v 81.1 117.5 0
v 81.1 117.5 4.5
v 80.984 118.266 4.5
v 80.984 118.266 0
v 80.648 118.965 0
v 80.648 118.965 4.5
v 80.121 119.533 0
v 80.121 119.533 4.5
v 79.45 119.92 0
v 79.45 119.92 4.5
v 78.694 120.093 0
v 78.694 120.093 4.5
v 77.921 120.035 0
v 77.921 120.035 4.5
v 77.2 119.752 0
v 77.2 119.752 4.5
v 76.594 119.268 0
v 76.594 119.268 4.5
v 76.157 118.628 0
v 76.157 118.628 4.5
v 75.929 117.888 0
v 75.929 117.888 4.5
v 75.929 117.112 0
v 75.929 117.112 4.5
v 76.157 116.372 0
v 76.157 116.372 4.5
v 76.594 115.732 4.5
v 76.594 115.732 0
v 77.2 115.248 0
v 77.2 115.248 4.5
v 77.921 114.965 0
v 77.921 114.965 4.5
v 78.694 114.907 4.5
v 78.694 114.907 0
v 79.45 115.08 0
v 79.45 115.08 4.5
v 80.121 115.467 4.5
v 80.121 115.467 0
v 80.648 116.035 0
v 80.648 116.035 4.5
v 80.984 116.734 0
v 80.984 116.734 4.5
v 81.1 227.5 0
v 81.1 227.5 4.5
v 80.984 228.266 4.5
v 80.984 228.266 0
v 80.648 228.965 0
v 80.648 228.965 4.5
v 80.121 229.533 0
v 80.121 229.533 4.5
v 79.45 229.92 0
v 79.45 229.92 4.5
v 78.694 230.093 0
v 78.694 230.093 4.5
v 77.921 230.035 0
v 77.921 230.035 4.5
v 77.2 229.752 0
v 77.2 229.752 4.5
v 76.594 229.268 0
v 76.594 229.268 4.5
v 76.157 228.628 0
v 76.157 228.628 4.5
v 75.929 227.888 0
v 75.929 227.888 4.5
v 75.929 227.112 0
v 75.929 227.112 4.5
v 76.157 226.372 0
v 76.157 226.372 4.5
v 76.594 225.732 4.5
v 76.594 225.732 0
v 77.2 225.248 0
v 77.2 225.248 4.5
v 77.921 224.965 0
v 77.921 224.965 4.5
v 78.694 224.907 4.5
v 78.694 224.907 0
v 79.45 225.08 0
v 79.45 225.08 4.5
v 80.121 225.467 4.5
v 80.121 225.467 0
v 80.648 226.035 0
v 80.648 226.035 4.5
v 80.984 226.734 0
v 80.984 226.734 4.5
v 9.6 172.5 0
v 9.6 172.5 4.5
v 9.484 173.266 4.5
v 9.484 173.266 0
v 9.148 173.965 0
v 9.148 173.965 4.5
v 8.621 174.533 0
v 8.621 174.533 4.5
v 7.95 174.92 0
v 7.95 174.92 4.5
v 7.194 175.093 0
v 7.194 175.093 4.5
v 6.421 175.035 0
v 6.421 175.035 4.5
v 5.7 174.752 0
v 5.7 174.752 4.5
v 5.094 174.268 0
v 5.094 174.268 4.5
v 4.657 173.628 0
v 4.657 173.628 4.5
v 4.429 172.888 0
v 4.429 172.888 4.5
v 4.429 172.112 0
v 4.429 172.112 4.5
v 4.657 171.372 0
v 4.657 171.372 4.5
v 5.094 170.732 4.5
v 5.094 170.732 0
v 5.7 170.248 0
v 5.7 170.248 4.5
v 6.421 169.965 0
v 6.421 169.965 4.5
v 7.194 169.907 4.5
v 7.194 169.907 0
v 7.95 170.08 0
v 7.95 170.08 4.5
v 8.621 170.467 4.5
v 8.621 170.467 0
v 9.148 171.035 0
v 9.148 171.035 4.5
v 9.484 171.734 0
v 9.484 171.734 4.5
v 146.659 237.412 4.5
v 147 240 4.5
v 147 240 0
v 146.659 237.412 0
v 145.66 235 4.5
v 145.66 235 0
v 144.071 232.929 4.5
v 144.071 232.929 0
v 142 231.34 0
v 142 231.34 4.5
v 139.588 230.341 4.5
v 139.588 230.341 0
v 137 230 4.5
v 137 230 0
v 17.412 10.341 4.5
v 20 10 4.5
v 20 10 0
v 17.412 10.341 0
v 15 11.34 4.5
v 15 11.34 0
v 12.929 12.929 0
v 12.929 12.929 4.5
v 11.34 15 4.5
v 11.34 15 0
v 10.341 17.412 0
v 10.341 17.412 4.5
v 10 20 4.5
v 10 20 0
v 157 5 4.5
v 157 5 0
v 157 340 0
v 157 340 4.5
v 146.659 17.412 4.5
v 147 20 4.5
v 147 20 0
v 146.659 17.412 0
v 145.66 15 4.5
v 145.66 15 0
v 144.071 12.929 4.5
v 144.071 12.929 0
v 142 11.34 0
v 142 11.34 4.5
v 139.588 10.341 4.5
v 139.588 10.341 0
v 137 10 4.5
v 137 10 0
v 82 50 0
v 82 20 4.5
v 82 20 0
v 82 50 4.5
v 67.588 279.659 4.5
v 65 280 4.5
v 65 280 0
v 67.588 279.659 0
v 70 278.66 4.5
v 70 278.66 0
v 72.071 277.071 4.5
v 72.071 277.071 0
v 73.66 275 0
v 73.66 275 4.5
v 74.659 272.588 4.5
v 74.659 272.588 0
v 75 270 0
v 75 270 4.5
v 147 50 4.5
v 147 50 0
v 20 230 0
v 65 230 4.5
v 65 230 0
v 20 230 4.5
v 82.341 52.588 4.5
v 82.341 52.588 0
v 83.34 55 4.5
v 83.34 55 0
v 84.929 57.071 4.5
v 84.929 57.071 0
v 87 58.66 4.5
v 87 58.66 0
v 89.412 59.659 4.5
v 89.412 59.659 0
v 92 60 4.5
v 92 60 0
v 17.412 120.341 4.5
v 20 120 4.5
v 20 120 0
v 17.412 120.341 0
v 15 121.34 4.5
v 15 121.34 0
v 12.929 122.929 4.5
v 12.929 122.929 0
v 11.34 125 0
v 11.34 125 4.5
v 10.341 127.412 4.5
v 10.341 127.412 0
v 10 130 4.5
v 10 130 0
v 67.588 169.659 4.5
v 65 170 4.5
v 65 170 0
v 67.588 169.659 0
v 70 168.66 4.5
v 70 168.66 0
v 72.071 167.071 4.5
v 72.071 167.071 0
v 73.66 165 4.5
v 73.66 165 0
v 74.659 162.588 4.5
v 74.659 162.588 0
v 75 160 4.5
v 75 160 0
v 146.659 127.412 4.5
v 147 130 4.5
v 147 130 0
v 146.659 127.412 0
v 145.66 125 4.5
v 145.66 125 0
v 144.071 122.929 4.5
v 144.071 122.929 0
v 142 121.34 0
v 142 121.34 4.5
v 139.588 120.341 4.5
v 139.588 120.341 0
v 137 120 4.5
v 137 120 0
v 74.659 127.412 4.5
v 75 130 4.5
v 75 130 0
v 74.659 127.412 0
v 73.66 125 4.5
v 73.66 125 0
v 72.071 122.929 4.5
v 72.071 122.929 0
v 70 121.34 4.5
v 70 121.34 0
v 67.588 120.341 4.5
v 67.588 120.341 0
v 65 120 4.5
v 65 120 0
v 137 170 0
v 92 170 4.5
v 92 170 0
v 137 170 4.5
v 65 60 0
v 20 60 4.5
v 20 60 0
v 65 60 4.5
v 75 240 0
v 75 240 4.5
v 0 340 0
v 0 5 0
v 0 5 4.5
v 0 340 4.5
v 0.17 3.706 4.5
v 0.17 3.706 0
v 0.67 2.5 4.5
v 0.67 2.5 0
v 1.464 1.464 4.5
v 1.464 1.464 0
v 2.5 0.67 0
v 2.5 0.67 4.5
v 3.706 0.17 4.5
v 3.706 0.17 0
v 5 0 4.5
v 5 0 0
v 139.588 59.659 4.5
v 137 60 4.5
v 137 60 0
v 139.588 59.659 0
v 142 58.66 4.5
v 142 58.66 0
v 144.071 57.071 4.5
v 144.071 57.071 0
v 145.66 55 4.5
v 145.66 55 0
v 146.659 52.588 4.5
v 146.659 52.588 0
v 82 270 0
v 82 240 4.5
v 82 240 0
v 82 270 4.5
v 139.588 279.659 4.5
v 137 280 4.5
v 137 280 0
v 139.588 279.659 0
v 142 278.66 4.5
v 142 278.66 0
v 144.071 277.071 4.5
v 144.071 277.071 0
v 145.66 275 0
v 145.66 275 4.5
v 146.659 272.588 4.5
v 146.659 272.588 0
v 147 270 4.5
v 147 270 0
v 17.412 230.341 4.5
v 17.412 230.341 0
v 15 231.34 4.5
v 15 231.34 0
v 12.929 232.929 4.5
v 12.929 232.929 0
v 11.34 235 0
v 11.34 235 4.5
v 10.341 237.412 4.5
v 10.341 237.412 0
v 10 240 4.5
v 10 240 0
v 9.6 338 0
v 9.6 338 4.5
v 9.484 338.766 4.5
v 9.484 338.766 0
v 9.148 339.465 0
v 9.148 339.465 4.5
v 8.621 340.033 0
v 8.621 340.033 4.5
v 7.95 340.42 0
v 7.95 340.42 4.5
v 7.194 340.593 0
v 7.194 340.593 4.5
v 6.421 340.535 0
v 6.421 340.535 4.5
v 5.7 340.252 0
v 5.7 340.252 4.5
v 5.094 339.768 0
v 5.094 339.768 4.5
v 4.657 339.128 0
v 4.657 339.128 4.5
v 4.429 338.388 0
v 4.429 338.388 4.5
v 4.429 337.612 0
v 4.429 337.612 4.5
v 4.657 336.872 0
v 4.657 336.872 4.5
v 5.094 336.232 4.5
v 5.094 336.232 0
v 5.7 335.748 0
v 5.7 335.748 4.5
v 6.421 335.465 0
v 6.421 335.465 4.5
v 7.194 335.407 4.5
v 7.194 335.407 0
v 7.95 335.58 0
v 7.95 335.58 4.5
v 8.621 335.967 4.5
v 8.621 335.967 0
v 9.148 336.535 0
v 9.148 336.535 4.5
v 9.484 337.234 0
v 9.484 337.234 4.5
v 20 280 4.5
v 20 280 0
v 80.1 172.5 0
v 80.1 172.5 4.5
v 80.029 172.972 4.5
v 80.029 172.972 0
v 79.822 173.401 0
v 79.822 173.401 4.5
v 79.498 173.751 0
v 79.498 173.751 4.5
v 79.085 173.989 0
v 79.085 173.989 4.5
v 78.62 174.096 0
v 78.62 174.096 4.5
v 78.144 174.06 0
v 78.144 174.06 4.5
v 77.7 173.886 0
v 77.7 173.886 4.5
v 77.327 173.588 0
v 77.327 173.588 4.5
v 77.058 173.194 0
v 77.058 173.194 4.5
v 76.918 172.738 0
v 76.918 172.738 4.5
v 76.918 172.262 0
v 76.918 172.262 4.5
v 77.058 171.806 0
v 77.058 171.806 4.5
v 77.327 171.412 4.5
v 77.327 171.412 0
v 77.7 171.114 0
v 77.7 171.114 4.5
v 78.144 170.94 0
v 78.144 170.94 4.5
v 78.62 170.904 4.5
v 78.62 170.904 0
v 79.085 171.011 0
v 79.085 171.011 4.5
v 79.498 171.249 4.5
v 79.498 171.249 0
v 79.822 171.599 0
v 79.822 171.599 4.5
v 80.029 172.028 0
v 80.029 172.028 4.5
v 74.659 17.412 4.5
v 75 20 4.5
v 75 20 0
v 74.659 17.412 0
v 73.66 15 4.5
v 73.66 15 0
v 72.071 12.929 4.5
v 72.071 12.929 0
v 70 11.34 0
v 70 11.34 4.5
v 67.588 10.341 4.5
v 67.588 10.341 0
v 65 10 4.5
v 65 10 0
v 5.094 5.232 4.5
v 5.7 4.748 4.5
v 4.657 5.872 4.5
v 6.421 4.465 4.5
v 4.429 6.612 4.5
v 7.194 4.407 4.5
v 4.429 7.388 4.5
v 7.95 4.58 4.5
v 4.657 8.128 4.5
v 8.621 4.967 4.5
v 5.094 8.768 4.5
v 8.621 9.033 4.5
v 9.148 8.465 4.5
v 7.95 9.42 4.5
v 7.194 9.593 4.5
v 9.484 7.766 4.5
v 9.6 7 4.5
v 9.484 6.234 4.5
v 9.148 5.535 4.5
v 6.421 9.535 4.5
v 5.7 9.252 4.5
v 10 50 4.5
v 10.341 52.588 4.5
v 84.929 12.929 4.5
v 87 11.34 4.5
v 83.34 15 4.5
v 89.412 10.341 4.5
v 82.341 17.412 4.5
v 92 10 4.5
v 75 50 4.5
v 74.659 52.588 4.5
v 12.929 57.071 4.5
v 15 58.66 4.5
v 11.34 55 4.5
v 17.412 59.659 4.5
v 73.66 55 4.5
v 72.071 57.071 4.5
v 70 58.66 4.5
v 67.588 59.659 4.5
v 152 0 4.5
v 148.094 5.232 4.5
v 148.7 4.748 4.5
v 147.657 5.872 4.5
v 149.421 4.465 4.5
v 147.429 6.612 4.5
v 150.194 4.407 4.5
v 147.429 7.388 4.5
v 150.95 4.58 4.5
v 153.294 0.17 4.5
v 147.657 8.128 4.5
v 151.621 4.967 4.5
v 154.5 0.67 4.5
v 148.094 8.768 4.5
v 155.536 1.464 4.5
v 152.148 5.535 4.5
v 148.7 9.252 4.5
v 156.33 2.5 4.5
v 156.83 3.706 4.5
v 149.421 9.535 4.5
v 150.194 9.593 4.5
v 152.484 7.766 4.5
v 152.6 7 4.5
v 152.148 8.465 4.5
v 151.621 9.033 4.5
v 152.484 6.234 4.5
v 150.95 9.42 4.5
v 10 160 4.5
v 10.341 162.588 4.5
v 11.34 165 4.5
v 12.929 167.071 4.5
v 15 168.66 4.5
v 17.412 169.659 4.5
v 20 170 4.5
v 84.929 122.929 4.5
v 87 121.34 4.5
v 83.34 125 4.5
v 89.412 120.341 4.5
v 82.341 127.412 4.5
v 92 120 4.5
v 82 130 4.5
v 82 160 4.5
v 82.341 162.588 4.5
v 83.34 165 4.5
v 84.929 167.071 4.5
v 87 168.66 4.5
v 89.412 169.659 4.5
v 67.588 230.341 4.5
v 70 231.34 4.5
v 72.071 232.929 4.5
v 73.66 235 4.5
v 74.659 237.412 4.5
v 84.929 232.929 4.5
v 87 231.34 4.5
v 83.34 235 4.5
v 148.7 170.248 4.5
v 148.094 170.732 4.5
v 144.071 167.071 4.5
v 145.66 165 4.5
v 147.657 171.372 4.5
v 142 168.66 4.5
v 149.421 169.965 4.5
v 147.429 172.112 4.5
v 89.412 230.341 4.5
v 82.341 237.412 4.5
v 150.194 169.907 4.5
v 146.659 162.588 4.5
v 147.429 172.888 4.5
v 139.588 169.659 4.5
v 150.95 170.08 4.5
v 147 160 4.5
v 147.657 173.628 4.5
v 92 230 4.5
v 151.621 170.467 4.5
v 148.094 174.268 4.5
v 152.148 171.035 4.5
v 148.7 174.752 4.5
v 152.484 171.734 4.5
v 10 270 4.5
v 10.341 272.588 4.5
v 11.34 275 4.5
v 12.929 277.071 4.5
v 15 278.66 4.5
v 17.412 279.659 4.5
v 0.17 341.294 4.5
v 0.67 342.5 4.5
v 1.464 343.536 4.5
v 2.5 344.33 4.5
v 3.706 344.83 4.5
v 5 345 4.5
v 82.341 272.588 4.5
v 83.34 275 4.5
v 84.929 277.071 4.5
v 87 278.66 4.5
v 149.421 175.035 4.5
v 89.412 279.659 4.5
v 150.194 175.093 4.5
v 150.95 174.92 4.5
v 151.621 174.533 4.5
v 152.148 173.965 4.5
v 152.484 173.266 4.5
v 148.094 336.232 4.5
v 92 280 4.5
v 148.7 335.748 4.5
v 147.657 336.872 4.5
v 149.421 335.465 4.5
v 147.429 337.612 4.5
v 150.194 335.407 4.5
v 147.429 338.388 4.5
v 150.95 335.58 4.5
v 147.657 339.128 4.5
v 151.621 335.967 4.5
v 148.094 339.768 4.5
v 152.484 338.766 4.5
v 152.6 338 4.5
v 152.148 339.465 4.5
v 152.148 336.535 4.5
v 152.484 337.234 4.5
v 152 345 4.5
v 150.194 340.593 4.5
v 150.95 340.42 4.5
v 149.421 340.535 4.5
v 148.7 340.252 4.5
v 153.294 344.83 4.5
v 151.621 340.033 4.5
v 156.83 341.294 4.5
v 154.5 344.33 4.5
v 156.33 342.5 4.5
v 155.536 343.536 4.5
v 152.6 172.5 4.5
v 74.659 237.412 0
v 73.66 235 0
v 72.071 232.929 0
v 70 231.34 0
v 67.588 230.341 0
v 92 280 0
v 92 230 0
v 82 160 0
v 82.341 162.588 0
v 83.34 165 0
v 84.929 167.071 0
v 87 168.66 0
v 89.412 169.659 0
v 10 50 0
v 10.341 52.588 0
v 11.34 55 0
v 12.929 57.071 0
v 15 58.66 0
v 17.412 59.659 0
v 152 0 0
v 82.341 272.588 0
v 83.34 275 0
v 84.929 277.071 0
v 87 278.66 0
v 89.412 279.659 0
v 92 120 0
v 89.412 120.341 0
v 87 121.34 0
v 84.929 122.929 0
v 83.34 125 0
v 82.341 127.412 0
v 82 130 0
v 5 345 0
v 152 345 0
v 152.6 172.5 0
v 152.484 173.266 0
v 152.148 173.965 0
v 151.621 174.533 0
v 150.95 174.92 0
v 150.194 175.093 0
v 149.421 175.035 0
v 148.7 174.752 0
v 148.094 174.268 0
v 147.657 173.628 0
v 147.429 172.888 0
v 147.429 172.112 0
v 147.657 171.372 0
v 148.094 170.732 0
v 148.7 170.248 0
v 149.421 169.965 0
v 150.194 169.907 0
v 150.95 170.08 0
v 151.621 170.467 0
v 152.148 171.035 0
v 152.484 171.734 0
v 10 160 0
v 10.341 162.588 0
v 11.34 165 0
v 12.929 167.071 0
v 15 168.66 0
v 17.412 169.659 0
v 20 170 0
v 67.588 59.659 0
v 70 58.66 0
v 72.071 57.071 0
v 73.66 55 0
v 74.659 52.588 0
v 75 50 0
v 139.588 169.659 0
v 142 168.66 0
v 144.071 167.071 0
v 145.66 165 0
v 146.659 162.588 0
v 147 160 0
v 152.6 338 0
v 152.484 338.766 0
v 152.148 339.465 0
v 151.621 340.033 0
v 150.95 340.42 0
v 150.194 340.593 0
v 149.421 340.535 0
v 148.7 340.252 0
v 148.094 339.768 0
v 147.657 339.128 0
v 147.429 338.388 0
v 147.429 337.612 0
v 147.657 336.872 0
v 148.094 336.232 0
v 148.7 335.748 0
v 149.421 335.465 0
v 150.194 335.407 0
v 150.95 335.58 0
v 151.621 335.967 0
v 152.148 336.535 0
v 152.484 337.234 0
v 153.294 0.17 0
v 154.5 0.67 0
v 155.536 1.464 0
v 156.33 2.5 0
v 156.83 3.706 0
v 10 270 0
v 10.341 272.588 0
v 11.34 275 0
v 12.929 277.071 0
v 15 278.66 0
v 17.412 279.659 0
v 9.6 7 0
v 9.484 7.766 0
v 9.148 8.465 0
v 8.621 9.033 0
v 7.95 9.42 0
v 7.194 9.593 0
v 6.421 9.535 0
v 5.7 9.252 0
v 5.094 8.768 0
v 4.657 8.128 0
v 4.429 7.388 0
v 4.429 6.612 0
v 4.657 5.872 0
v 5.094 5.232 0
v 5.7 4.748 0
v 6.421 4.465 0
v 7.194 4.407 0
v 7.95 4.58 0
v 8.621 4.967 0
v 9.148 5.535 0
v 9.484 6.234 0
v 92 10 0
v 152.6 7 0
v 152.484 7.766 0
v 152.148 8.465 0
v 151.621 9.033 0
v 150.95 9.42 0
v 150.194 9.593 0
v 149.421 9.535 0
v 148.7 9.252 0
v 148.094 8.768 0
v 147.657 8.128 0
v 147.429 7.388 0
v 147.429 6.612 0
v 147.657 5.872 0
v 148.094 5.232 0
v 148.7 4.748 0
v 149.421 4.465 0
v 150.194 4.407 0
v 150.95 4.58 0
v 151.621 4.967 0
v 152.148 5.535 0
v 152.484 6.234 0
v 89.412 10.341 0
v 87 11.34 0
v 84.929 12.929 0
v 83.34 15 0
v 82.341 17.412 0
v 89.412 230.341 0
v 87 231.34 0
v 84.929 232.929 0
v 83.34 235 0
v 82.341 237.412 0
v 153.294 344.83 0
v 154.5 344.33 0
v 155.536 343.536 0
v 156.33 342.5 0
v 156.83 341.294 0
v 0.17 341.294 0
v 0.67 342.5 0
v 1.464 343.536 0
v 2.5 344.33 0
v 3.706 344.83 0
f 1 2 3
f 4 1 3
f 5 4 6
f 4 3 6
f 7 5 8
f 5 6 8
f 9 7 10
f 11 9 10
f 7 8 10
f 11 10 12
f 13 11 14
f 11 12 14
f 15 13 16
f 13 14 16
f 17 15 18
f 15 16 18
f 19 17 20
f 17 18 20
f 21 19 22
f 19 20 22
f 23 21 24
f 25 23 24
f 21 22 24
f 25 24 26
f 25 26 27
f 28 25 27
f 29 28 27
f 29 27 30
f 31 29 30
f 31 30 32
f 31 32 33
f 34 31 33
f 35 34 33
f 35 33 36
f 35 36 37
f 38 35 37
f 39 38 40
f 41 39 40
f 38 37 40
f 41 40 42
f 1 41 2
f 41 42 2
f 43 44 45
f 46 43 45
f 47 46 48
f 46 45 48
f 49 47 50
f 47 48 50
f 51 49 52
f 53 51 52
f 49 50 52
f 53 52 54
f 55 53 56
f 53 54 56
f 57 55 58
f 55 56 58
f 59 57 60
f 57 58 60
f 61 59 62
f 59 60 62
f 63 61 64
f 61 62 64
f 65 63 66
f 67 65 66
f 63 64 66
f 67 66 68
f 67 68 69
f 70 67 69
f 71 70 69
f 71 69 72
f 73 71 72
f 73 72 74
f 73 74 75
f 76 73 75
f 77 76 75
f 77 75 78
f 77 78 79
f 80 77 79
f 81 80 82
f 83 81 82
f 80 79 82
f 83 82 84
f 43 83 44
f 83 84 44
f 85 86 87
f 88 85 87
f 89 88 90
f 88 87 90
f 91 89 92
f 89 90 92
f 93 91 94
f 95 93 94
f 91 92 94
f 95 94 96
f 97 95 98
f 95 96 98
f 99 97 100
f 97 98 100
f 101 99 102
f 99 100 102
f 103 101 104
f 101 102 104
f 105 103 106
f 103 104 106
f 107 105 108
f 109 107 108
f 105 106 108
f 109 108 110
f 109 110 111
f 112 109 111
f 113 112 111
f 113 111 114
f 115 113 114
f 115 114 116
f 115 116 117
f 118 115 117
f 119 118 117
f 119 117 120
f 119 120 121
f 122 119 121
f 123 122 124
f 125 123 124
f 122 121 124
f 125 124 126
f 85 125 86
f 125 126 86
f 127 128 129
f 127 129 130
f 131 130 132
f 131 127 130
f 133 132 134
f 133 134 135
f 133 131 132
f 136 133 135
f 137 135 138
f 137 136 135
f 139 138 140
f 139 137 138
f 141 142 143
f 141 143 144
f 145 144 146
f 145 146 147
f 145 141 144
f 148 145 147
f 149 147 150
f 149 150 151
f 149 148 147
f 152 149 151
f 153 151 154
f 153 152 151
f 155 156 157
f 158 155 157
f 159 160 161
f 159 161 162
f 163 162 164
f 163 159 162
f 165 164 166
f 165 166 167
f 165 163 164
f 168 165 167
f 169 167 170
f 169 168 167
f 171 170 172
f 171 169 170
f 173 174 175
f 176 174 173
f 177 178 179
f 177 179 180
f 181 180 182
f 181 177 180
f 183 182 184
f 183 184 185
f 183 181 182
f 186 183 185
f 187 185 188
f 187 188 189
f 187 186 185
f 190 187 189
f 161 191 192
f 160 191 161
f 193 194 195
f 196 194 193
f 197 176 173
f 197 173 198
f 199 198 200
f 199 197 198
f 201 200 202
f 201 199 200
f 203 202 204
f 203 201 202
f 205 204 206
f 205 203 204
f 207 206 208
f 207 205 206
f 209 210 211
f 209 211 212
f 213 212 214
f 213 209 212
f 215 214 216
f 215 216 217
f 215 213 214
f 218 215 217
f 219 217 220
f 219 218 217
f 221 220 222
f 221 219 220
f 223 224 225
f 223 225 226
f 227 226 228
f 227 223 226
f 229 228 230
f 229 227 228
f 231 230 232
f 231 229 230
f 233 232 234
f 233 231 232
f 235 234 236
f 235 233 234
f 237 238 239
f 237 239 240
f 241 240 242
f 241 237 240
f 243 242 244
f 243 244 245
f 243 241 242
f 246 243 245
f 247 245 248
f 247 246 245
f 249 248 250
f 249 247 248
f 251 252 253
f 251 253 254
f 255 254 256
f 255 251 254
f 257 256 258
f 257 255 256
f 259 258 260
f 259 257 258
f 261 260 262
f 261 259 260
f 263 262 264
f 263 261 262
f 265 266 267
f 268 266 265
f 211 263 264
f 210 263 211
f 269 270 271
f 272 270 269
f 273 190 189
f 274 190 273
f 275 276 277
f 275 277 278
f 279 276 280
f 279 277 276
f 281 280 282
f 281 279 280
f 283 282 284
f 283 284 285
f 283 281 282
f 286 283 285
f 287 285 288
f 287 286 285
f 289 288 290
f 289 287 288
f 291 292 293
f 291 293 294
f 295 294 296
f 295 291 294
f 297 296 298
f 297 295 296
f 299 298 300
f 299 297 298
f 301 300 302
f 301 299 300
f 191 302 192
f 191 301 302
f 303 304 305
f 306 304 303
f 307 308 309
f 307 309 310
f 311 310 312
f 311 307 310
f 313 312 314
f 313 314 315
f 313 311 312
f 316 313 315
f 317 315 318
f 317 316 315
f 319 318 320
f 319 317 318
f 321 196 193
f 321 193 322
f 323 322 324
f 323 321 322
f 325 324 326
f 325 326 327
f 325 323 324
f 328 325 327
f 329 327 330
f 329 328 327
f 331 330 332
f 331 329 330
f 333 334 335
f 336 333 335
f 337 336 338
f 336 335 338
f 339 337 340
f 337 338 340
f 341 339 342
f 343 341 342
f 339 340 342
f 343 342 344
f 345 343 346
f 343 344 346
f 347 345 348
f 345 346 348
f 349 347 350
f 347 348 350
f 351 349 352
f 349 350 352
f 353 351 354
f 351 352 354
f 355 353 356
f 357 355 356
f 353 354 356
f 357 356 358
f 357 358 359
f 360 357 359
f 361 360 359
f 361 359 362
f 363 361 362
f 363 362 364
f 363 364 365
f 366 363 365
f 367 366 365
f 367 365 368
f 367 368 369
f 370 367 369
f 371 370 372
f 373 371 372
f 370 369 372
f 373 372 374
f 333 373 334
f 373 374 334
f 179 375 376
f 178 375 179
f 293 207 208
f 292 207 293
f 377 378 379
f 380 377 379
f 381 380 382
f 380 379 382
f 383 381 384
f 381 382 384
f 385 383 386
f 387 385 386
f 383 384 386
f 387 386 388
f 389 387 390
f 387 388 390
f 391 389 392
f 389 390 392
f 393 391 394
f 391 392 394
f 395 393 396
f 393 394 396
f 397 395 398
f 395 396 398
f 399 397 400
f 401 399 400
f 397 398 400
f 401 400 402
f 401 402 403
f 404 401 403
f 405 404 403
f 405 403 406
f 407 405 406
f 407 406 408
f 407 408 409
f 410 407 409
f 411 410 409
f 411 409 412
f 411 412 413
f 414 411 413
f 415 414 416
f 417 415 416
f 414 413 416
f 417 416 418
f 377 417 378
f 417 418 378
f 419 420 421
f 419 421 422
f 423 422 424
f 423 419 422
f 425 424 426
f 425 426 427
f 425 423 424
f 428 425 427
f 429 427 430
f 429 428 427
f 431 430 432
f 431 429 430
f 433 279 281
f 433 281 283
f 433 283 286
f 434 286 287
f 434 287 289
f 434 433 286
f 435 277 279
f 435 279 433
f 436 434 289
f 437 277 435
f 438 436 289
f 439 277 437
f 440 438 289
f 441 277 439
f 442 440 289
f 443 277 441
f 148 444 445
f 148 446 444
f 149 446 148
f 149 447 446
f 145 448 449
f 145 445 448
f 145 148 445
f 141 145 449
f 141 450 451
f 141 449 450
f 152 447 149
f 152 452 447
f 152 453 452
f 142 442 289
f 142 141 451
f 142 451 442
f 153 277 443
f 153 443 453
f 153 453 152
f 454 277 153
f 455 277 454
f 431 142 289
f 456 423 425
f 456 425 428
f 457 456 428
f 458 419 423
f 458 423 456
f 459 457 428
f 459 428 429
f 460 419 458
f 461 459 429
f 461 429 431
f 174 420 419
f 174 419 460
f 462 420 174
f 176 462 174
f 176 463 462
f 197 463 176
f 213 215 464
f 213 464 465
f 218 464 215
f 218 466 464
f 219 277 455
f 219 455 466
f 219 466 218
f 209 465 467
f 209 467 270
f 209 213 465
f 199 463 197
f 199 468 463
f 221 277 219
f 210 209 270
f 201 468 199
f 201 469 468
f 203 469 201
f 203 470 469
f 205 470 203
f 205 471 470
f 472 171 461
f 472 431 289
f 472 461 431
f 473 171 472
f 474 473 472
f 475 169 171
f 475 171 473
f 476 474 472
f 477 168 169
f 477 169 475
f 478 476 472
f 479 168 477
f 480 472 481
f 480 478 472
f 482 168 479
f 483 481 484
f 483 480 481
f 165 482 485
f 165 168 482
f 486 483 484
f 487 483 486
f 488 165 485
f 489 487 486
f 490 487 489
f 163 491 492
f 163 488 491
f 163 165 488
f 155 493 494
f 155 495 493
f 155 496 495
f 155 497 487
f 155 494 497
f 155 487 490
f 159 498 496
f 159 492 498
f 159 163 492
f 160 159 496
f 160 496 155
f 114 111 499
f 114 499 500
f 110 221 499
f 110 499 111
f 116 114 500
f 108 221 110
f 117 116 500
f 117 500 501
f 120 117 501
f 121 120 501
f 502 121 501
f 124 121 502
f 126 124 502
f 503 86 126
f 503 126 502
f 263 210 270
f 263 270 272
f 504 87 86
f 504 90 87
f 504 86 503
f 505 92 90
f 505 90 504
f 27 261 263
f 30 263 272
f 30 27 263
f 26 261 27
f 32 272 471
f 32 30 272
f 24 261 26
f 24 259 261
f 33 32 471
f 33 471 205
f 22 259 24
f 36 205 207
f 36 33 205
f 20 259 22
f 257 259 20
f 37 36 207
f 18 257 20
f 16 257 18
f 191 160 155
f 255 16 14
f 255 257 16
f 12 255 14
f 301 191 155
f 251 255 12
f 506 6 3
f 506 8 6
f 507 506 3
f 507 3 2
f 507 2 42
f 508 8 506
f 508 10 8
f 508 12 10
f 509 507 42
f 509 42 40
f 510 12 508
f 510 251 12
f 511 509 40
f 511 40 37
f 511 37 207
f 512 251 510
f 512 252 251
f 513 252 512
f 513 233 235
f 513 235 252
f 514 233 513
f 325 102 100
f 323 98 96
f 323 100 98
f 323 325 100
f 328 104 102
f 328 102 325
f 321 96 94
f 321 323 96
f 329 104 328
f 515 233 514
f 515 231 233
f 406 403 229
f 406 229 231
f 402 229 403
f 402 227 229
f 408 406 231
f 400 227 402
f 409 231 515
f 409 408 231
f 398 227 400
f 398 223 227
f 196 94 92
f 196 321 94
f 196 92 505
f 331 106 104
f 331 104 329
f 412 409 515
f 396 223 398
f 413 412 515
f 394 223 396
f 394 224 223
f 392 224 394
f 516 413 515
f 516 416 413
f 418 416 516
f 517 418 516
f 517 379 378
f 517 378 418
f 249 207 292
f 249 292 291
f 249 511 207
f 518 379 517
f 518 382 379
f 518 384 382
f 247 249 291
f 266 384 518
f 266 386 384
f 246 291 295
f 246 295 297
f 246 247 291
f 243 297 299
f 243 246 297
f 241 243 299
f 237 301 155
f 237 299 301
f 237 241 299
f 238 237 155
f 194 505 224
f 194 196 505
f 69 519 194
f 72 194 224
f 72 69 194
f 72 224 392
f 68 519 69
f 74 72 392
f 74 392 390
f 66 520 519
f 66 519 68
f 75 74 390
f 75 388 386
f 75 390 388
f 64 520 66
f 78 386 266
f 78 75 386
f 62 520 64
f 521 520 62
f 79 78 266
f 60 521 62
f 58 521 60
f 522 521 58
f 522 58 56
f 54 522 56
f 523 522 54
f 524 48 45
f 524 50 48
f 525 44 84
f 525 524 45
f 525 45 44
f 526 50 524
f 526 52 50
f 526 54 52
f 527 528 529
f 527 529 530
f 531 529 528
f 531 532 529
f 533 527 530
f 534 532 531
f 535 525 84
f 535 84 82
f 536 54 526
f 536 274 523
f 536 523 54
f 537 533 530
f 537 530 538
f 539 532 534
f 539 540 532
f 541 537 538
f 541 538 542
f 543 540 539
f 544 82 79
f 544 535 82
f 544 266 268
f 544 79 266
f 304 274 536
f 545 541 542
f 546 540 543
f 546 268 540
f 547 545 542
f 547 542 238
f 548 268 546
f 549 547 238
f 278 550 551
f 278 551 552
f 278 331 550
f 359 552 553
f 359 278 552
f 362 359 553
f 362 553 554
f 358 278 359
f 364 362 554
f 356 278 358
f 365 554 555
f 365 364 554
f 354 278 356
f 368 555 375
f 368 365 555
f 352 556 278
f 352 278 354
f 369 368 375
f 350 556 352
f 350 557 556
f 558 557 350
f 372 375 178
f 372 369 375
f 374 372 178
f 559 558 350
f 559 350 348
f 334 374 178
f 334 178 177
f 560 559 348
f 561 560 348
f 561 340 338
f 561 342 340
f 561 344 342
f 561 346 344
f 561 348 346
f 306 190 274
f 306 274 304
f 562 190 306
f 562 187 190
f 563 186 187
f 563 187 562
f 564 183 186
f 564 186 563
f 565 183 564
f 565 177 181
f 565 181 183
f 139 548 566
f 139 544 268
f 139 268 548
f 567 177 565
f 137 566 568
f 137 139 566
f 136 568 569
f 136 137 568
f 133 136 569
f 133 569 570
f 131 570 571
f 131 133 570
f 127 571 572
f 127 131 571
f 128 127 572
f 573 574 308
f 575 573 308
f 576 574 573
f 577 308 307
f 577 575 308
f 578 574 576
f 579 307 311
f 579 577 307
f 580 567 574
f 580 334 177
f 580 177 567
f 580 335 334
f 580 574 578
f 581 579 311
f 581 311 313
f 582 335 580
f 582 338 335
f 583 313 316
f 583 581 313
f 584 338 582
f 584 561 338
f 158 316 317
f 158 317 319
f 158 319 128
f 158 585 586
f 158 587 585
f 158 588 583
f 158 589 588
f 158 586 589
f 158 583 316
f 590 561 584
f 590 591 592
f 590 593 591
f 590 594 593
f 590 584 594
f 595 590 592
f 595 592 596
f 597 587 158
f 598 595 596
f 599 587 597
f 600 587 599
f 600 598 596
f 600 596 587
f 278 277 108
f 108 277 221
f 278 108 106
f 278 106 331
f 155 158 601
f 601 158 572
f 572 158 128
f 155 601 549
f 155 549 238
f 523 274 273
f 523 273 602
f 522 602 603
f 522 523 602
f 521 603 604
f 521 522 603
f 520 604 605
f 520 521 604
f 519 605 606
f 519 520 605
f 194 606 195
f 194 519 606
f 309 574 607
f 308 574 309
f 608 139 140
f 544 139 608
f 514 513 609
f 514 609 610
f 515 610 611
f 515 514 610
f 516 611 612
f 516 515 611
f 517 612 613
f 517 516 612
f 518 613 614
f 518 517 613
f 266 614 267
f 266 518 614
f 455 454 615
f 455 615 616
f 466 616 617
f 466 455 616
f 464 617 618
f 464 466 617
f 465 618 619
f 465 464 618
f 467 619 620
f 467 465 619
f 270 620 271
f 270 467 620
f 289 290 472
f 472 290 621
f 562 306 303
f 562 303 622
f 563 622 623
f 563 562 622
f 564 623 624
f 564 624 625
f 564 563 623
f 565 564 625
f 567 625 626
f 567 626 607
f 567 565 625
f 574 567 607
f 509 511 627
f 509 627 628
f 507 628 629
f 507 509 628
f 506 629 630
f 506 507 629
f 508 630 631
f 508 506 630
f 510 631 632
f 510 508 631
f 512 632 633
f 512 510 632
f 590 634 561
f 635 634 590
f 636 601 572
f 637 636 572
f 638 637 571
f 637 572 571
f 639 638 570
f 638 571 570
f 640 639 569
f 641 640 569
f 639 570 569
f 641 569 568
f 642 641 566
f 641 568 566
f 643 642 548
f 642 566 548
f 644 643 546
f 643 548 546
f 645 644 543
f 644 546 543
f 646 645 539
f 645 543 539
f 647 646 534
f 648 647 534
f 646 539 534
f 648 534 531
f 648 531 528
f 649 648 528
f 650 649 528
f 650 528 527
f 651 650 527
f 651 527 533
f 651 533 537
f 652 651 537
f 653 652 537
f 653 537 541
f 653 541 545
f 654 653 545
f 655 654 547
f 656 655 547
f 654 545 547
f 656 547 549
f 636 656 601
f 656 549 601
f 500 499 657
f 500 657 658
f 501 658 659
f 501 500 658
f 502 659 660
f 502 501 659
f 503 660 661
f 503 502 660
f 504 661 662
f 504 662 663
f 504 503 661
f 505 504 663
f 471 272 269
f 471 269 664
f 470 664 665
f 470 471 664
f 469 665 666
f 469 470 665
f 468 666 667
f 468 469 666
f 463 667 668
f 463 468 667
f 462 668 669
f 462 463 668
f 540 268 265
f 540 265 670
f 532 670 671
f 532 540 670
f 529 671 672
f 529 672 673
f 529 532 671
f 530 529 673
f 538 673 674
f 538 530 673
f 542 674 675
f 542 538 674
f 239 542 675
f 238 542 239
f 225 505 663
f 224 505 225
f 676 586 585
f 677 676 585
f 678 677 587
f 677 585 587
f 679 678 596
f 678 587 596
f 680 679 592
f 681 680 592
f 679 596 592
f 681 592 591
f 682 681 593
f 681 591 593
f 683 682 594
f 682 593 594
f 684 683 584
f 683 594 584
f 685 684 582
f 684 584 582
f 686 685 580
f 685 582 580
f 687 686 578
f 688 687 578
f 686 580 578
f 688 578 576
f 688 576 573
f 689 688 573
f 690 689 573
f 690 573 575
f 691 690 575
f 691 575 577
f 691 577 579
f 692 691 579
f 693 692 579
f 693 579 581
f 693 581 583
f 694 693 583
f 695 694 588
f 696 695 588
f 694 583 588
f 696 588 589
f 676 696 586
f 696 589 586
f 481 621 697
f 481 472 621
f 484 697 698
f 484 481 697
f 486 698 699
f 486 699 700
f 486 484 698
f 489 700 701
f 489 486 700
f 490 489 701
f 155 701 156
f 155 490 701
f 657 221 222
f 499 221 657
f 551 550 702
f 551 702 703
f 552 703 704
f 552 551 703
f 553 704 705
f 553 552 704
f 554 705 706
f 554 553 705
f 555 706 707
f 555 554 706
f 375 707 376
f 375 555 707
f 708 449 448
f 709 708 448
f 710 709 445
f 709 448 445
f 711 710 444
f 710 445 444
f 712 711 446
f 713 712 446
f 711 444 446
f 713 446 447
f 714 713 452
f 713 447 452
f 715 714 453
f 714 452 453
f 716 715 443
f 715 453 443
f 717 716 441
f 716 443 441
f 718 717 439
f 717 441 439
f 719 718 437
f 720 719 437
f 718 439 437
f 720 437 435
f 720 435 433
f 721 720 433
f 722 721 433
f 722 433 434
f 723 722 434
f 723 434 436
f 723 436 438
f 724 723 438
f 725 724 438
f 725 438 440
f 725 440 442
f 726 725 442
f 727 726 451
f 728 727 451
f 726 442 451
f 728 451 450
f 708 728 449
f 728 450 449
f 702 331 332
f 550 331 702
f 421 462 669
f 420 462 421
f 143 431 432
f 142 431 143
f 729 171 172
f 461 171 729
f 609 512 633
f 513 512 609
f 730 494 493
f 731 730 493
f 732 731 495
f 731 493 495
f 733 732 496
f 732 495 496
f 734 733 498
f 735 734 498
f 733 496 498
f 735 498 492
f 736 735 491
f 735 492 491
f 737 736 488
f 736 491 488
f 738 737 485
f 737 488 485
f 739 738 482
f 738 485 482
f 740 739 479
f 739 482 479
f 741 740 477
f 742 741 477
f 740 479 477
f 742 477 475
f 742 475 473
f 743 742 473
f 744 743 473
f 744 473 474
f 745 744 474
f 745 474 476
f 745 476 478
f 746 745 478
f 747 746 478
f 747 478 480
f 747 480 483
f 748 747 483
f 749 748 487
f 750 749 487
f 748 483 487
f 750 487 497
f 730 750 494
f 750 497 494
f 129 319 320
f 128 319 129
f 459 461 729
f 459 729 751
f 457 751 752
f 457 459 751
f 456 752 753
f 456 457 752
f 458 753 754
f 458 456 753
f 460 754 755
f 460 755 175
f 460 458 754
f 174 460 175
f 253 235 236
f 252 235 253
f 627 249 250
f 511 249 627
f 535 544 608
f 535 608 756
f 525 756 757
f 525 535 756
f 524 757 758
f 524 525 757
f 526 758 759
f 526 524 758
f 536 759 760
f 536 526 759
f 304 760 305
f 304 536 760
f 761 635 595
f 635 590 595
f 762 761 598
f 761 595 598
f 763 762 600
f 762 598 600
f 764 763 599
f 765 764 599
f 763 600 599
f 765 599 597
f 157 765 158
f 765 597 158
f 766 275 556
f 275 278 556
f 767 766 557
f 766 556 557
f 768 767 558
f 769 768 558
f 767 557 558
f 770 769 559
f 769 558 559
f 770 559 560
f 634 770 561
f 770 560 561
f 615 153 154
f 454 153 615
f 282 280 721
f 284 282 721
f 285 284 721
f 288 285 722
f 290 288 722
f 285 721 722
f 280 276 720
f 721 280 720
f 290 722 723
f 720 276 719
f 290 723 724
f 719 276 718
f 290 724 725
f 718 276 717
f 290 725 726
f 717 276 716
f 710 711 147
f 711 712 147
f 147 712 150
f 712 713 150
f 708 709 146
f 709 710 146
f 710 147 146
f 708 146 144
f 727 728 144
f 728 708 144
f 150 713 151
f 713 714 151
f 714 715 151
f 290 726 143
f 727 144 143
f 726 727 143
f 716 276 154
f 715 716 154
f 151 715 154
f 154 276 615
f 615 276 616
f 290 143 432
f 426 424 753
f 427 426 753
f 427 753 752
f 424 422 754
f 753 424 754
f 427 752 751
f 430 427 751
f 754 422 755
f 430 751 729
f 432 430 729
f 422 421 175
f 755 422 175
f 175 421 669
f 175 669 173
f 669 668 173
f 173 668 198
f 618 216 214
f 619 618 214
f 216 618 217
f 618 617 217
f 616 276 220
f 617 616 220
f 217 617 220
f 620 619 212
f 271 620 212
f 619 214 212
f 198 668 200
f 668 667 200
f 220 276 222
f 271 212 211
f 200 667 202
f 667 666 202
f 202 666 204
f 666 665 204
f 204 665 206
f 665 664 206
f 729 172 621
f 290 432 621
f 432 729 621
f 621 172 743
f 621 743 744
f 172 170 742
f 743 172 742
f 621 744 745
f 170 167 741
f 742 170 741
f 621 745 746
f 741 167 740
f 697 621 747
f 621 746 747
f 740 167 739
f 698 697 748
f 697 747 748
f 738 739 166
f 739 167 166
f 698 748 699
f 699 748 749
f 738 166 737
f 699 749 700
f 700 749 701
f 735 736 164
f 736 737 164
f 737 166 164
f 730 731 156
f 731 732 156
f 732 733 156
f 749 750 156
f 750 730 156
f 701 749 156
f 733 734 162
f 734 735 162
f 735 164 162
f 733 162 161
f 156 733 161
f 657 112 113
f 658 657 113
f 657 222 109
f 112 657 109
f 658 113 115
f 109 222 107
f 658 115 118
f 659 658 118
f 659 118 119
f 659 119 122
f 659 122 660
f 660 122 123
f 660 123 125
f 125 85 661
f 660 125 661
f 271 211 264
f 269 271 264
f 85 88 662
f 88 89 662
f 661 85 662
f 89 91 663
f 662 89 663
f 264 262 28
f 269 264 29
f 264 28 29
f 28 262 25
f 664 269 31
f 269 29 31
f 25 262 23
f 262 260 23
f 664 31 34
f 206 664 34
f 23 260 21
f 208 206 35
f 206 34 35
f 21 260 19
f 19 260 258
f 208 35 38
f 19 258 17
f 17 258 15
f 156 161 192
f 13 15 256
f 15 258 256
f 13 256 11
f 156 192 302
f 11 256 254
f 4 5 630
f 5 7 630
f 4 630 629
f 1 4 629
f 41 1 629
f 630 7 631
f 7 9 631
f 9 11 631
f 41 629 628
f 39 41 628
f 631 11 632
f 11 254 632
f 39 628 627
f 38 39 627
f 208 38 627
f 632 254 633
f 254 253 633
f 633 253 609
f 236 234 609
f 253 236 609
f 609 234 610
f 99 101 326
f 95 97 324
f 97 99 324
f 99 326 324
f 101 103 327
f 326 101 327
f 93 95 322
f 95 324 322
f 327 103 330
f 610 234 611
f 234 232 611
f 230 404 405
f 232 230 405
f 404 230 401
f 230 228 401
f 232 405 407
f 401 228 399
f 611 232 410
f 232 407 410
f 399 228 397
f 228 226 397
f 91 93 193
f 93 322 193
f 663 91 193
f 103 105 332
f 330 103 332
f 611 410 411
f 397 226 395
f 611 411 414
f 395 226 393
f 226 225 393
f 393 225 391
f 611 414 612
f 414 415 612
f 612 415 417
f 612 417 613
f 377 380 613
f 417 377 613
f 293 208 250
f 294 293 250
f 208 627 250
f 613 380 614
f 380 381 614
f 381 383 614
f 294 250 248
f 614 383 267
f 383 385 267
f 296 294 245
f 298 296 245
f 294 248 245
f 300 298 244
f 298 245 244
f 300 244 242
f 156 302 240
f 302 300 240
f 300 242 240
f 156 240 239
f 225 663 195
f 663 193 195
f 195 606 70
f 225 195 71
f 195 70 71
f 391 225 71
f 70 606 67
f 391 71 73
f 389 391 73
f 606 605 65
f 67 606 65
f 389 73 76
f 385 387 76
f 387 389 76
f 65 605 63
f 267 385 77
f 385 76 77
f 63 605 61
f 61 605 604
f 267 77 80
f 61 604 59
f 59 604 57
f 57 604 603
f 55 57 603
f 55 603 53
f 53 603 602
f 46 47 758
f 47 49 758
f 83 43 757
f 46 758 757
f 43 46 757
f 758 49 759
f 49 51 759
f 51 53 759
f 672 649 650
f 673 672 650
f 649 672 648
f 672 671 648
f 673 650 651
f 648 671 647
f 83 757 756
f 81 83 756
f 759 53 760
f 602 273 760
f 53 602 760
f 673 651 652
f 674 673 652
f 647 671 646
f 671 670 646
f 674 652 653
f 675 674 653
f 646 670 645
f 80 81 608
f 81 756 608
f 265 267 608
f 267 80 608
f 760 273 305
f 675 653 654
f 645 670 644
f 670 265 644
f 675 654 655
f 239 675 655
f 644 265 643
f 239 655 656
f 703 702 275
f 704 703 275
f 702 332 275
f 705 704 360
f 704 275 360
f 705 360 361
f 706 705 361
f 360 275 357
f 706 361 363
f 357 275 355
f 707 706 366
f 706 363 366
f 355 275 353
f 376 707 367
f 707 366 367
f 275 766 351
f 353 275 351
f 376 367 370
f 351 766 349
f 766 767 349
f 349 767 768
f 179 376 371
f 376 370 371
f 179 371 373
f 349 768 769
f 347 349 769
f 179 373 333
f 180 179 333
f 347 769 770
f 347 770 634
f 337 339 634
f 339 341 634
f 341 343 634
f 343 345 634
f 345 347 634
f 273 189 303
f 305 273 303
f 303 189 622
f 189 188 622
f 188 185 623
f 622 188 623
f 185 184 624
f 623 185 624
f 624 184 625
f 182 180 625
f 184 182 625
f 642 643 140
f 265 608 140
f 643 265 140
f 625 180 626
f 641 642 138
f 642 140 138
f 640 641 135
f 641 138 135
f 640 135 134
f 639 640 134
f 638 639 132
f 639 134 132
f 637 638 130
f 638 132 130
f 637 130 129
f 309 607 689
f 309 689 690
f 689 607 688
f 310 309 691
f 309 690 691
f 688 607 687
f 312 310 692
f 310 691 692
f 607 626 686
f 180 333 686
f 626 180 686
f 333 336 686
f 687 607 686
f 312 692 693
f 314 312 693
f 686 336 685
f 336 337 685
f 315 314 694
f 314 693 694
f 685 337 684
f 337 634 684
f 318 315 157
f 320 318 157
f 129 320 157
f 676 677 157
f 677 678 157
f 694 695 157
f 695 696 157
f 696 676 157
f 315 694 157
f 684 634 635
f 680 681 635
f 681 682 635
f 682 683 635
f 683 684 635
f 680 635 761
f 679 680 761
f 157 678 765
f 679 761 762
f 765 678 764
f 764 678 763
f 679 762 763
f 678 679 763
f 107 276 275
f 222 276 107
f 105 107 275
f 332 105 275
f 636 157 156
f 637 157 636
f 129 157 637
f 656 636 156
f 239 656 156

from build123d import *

# Parameters (mm, degrees)
SKETCH_1_W          = 157
SKETCH_1_H          = 345
EXTRUDE_1_DEPTH     = 4.5
CUT_EXTRUDE_1_DEPTH = 4.5
SKETCH_3_R          = 2.6
SKETCH_3_R_2        = 1.6
CUT_EXTRUDE_2_DEPTH = 4.5
FILLET_1_R          = 5


with BuildPart() as part:
    # 草图1 → 凸台-拉伸1 (new body)
    with BuildSketch(Plane.XY):
        with Locations((78.5, 172.5)):
            Rectangle(SKETCH_1_W, SKETCH_1_H)
    extrude(amount=EXTRUDE_1_DEPTH)

    # 草图2 → 切除-拉伸1 (cut)
    with BuildSketch(Plane.XY.offset(4.5)):
        with BuildLine():
            Line((20, 60), (65, 60))
            ThreePointArc((65, 60), (72.071067812, 57.071067812), (75, 50))
            Line((75, 50), (75, 20))
            ThreePointArc((75, 20), (72.071067812, 12.928932188), (65, 10))
            Line((65, 10), (20, 10))
            ThreePointArc((20, 10), (12.928932188, 12.928932188), (10, 20))
            Line((10, 20), (10, 50))
            ThreePointArc((10, 50), (12.928932188, 57.071067812), (20, 60))
        make_face()
        with BuildLine():
            Line((92, 60), (137, 60))
            ThreePointArc((137, 60), (144.071067812, 57.071067812), (147, 50))
            Line((147, 50), (147, 20))
            ThreePointArc((147, 20), (144.071067812, 12.928932188), (137, 10))
            Line((137, 10), (92, 10))
            ThreePointArc((92, 10), (84.928932188, 12.928932188), (82, 20))
            Line((82, 20), (82, 50))
            ThreePointArc((82, 50), (84.928932188, 57.071067812), (92, 60))
        make_face()
        with BuildLine():
            Line((92, 170), (137, 170))
            ThreePointArc((137, 170), (144.071067812, 167.071067812), (147, 160))
            Line((147, 160), (147, 130))
            ThreePointArc((147, 130), (144.071067812, 122.928932188), (137, 120))
            Line((137, 120), (92, 120))
            ThreePointArc((92, 120), (84.928932188, 122.928932188), (82, 130))
            Line((82, 130), (82, 160))
            ThreePointArc((82, 160), (84.928932188, 167.071067812), (92, 170))
        make_face()
        with BuildLine():
            Line((92, 280), (137, 280))
            ThreePointArc((137, 280), (144.071067812, 277.071067812), (147, 270))
            Line((147, 270), (147, 240))
            ThreePointArc((147, 240), (144.071067812, 232.928932188), (137, 230))
            Line((137, 230), (92, 230))
            ThreePointArc((92, 230), (84.928932188, 232.928932188), (82, 240))
            Line((82, 240), (82, 270))
            ThreePointArc((82, 270), (84.928932188, 277.071067812), (92, 280))
        make_face()
        with BuildLine():
            Line((20, 170), (65, 170))
            ThreePointArc((65, 170), (72.071067812, 167.071067812), (75, 160))
            Line((75, 160), (75, 130))
            ThreePointArc((75, 130), (72.071067812, 122.928932188), (65, 120))
            Line((65, 120), (20, 120))
            ThreePointArc((20, 120), (12.928932188, 122.928932188), (10, 130))
            Line((10, 130), (10, 160))
            ThreePointArc((10, 160), (12.928932188, 167.071067812), (20, 170))
        make_face()
        with BuildLine():
            Line((20, 280), (65, 280))
            ThreePointArc((65, 280), (72.071067812, 277.071067812), (75, 270))
            Line((75, 270), (75, 240))
            ThreePointArc((75, 240), (72.071067812, 232.928932188), (65, 230))
            Line((65, 230), (20, 230))
            ThreePointArc((20, 230), (12.928932188, 232.928932188), (10, 240))
            Line((10, 240), (10, 270))
            ThreePointArc((10, 270), (12.928932188, 277.071067812), (20, 280))
        make_face()
    extrude(amount=-CUT_EXTRUDE_1_DEPTH, mode=Mode.SUBTRACT)

    # 草图3 → 切除-拉伸2 (cut)
    with BuildSketch(Plane.XY.offset(4.5)):
        with Locations((7, 338)):
            Circle(SKETCH_3_R)
        with Locations((150, 338)):
            Circle(SKETCH_3_R)
        with Locations((150, 7)):
            Circle(SKETCH_3_R)
        with Locations((7, 7)):
            Circle(SKETCH_3_R)
        with Locations((150, 172.5)):
            Circle(SKETCH_3_R)
        with Locations((7, 172.5)):
            Circle(SKETCH_3_R)
        with Locations((78.5, 172.5)):
            Circle(SKETCH_3_R_2)
        with Locations((78.5, 227.5)):
            Circle(SKETCH_3_R)
        with Locations((78.5, 117.5)):
            Circle(SKETCH_3_R)
    extrude(amount=-CUT_EXTRUDE_2_DEPTH, mode=Mode.SUBTRACT)

    # 圆角1
    fillet_1_edges = [part.edges().sort_by_distance(p)[0] for p in [
        (0, 345, 2.25),
        (157, 345, 2.25),
        (157, 0, 2.25),
        (0, 0, 2.25),
    ]]
    fillet(fillet_1_edges, radius=FILLET_1_R)


solid = part.part
